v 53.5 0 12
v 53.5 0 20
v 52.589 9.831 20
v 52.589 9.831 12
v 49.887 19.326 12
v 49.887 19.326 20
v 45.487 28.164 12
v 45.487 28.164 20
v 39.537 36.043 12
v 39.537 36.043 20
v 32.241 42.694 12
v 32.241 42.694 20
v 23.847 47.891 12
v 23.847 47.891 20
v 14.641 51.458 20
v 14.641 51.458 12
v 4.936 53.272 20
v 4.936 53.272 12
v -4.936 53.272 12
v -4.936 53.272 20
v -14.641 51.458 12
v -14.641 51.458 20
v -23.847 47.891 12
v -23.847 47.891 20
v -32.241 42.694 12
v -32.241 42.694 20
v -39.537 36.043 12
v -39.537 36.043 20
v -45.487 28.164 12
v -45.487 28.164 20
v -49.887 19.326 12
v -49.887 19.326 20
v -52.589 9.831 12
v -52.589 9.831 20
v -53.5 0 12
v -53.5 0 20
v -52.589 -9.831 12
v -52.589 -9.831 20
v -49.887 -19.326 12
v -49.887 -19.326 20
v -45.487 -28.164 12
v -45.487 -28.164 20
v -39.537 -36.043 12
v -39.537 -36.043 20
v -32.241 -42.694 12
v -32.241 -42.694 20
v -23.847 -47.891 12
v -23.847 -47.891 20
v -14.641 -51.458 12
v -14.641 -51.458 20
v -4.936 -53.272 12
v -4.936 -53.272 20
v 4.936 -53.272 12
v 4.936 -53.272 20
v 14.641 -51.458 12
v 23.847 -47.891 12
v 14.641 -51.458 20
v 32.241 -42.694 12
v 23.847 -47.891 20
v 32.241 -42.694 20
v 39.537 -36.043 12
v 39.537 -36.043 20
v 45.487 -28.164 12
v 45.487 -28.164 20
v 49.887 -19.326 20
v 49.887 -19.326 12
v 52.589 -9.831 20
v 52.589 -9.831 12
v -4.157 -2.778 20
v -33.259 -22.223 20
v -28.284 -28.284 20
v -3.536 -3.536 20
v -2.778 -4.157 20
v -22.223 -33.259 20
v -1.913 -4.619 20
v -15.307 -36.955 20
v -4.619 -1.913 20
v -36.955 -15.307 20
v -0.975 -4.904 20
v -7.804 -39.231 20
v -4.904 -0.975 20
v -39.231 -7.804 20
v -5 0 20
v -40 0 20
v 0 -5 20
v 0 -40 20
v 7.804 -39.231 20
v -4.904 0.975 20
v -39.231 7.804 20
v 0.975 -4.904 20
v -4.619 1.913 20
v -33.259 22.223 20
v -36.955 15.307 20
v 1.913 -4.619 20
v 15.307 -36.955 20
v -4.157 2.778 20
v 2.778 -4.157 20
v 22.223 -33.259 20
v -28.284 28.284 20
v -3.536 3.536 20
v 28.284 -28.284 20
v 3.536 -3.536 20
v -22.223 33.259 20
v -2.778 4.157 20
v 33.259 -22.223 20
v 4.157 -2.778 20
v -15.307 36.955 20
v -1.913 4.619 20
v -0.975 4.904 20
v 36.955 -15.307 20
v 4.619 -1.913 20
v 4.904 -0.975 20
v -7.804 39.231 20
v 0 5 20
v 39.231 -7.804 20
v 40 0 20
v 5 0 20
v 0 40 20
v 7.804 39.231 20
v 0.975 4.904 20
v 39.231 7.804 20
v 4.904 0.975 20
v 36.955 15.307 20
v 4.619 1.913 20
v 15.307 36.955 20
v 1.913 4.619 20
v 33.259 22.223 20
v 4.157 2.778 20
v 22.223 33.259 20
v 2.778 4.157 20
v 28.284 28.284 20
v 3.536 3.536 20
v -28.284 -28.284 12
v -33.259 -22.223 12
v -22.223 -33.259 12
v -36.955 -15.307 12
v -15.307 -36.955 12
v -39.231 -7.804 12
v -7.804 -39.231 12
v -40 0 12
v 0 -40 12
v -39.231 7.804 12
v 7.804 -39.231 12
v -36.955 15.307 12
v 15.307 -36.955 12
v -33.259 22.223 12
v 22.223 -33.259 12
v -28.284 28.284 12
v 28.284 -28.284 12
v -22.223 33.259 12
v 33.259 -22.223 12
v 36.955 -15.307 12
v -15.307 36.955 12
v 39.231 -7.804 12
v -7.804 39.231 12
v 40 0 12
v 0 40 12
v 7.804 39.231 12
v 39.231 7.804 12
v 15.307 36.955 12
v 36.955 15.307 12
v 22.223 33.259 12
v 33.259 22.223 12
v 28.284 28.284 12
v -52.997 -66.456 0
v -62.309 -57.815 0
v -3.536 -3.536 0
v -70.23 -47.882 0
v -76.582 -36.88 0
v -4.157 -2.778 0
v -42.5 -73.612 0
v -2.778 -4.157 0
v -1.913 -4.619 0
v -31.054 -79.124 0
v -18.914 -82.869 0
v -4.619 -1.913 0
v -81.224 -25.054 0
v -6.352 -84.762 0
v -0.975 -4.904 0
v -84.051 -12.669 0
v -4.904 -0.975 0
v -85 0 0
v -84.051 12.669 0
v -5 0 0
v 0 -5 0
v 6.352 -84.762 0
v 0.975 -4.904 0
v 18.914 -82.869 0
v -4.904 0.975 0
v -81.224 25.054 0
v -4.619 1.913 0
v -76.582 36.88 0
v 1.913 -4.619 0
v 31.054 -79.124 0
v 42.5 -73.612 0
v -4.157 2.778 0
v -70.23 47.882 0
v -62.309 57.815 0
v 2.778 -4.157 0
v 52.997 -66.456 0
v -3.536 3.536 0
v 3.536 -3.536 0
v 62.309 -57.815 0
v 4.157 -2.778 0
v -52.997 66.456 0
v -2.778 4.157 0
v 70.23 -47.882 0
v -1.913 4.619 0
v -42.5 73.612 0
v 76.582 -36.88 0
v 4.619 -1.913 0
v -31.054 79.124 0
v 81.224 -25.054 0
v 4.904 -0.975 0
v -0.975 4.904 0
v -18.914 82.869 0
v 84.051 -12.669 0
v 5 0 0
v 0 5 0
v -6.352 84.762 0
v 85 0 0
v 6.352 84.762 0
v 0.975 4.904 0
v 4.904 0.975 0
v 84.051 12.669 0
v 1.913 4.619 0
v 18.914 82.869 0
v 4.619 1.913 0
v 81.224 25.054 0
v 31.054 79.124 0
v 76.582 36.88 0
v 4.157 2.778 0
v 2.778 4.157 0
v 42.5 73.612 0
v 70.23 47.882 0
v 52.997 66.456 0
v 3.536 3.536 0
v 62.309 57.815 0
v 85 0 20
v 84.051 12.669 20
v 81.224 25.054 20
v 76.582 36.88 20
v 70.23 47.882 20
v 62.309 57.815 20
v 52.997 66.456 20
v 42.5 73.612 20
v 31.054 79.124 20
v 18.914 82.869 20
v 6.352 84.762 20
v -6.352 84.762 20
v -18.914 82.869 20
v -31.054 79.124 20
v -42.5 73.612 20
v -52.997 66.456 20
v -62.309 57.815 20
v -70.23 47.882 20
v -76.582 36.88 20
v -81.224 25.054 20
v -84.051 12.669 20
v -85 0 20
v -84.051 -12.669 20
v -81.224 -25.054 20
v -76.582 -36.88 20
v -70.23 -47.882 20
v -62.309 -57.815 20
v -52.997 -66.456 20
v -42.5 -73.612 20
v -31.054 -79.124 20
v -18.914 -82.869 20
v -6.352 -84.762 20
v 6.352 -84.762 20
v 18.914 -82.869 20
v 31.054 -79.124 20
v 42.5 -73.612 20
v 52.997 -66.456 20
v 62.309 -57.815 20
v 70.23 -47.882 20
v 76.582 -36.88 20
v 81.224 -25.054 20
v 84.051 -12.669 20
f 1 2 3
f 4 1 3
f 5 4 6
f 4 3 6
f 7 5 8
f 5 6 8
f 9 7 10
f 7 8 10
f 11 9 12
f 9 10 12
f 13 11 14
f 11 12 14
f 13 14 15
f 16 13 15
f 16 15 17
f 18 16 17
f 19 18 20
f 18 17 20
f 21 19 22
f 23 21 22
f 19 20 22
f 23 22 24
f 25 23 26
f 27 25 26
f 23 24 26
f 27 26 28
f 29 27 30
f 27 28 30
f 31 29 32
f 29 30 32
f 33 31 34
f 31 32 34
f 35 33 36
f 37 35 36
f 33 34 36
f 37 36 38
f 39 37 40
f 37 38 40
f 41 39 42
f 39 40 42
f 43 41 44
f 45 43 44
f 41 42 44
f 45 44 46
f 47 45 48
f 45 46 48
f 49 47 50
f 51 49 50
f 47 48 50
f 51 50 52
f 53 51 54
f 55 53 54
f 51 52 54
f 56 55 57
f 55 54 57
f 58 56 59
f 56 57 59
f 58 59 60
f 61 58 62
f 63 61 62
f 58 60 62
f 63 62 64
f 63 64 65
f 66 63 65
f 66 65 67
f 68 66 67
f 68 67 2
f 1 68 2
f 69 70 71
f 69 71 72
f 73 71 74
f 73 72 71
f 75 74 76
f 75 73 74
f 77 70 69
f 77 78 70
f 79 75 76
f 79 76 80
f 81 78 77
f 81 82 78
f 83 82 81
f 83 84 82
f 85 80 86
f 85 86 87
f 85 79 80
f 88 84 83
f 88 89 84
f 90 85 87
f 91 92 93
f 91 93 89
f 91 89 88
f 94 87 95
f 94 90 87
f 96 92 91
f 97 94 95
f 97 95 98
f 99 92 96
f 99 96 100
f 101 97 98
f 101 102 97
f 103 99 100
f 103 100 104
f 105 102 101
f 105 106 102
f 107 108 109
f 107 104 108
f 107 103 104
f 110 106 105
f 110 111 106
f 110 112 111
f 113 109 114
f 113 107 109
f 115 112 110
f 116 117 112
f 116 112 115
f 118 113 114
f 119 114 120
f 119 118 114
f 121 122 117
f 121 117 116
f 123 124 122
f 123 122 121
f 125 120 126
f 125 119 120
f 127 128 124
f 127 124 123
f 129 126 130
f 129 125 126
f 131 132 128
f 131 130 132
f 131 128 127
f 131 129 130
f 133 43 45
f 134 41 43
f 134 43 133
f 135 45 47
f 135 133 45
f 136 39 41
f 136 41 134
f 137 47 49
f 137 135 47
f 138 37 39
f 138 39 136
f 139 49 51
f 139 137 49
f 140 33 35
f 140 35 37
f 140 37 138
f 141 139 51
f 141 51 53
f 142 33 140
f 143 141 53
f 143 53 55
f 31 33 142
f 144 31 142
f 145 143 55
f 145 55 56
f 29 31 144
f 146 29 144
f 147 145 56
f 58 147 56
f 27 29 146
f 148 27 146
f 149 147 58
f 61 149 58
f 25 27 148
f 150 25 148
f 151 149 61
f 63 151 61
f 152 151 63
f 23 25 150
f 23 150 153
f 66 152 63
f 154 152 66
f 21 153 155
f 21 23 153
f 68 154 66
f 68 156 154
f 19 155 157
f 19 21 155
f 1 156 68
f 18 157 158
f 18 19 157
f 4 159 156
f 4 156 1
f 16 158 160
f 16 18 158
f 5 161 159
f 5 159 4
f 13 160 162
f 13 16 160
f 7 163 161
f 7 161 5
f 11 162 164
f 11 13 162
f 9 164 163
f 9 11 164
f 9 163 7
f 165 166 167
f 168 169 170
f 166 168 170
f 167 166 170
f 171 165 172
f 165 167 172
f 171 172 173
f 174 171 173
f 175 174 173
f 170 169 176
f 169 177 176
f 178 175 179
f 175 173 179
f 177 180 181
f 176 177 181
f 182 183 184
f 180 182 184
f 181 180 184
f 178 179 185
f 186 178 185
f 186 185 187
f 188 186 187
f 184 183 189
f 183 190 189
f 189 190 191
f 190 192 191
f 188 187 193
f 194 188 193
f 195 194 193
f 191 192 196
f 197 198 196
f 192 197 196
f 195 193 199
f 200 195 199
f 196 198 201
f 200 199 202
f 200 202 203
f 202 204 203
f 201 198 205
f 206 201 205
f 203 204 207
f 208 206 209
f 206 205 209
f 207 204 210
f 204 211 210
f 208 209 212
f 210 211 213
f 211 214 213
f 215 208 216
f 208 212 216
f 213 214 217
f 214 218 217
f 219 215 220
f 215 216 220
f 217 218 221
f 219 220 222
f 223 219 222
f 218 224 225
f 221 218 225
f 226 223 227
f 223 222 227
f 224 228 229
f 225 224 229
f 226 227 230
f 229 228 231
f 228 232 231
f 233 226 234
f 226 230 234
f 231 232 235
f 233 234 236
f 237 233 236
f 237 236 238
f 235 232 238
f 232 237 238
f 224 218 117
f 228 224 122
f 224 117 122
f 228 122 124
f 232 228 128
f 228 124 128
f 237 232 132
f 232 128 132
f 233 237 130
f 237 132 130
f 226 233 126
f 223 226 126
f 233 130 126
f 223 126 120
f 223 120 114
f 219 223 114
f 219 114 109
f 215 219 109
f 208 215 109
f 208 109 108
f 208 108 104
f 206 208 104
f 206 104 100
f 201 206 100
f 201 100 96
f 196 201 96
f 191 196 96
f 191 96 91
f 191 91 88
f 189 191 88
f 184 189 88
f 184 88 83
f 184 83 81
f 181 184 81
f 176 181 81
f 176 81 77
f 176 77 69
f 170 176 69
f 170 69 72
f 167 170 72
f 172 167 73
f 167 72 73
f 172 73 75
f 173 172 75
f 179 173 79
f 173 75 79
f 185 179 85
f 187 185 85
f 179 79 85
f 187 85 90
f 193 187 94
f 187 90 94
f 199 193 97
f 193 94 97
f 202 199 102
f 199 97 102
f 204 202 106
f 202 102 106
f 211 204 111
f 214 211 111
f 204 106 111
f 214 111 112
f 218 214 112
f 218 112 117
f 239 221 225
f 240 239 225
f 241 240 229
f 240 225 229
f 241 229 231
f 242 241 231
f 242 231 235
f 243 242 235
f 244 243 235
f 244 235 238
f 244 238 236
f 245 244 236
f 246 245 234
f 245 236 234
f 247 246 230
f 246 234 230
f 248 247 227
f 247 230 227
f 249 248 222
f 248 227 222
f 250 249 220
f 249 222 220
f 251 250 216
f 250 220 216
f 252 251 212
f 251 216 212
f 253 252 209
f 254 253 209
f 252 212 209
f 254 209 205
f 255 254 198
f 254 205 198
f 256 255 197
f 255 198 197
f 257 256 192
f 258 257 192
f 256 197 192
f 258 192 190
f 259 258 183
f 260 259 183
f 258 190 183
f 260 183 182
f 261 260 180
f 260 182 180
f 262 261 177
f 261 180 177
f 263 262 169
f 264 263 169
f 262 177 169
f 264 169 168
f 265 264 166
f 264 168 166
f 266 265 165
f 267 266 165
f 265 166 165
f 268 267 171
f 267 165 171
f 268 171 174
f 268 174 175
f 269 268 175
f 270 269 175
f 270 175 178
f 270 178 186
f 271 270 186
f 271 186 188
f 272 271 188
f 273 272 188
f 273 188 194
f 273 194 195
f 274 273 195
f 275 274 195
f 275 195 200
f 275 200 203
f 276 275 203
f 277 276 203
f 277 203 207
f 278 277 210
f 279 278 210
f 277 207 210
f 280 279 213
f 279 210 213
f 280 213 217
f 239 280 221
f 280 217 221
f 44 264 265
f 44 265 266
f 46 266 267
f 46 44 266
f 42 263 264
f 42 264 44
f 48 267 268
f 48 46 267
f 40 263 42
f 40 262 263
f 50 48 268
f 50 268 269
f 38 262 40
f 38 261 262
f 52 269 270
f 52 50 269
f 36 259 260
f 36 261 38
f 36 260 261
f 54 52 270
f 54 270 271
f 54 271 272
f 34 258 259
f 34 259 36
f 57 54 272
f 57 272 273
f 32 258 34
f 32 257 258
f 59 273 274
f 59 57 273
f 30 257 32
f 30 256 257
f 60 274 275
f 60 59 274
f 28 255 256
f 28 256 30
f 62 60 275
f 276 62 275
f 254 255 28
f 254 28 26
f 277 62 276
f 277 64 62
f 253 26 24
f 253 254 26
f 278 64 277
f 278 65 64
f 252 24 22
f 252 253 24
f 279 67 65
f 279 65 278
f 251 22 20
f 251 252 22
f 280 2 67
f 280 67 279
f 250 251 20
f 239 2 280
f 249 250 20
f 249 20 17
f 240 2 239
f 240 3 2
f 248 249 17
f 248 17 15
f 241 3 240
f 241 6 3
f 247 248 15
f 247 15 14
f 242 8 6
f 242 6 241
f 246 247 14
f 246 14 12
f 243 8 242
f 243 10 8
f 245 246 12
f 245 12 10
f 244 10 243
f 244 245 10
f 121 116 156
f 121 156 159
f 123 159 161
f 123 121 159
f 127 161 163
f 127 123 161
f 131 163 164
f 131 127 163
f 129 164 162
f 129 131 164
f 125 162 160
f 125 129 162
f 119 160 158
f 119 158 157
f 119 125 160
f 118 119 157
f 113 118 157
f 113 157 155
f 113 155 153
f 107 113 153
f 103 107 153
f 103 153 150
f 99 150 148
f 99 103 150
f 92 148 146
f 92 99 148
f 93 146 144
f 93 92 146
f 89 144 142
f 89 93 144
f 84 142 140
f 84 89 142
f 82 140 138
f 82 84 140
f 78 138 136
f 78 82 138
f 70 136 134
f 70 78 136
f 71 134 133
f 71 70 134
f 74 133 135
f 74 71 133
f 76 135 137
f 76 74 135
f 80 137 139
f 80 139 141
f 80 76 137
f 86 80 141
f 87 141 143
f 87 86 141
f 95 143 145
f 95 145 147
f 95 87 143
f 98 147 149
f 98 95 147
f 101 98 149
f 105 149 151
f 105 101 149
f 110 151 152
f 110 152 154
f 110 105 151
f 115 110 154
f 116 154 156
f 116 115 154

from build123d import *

# Parameters (mm, degrees)
F0_R     = 85
F1_DEPTH = 20
F2_R     = 53.5
F2_R_2   = 40
F3_DEPTH = 8
F4_R     = 5
F5_DEPTH = 20.001


with BuildPart() as f1:
    # F0 (on Top) → F1 (new body)
    with BuildSketch(Plane.XY):
        Circle(F0_R)
    extrude(amount=F1_DEPTH)

    # F2 (on face) → F3 (cut)
    with BuildSketch(Plane.XY.offset(20)):
        Circle(F2_R)
        Circle(F2_R_2, mode=Mode.SUBTRACT)
    extrude(amount=-F3_DEPTH, mode=Mode.SUBTRACT)

    # F4 (on face) → F5 (cut, through all)
    with BuildSketch(Plane.XY.offset(20)):
        Circle(F4_R)
    extrude(amount=-F5_DEPTH, mode=Mode.SUBTRACT)


solid = f1.part
